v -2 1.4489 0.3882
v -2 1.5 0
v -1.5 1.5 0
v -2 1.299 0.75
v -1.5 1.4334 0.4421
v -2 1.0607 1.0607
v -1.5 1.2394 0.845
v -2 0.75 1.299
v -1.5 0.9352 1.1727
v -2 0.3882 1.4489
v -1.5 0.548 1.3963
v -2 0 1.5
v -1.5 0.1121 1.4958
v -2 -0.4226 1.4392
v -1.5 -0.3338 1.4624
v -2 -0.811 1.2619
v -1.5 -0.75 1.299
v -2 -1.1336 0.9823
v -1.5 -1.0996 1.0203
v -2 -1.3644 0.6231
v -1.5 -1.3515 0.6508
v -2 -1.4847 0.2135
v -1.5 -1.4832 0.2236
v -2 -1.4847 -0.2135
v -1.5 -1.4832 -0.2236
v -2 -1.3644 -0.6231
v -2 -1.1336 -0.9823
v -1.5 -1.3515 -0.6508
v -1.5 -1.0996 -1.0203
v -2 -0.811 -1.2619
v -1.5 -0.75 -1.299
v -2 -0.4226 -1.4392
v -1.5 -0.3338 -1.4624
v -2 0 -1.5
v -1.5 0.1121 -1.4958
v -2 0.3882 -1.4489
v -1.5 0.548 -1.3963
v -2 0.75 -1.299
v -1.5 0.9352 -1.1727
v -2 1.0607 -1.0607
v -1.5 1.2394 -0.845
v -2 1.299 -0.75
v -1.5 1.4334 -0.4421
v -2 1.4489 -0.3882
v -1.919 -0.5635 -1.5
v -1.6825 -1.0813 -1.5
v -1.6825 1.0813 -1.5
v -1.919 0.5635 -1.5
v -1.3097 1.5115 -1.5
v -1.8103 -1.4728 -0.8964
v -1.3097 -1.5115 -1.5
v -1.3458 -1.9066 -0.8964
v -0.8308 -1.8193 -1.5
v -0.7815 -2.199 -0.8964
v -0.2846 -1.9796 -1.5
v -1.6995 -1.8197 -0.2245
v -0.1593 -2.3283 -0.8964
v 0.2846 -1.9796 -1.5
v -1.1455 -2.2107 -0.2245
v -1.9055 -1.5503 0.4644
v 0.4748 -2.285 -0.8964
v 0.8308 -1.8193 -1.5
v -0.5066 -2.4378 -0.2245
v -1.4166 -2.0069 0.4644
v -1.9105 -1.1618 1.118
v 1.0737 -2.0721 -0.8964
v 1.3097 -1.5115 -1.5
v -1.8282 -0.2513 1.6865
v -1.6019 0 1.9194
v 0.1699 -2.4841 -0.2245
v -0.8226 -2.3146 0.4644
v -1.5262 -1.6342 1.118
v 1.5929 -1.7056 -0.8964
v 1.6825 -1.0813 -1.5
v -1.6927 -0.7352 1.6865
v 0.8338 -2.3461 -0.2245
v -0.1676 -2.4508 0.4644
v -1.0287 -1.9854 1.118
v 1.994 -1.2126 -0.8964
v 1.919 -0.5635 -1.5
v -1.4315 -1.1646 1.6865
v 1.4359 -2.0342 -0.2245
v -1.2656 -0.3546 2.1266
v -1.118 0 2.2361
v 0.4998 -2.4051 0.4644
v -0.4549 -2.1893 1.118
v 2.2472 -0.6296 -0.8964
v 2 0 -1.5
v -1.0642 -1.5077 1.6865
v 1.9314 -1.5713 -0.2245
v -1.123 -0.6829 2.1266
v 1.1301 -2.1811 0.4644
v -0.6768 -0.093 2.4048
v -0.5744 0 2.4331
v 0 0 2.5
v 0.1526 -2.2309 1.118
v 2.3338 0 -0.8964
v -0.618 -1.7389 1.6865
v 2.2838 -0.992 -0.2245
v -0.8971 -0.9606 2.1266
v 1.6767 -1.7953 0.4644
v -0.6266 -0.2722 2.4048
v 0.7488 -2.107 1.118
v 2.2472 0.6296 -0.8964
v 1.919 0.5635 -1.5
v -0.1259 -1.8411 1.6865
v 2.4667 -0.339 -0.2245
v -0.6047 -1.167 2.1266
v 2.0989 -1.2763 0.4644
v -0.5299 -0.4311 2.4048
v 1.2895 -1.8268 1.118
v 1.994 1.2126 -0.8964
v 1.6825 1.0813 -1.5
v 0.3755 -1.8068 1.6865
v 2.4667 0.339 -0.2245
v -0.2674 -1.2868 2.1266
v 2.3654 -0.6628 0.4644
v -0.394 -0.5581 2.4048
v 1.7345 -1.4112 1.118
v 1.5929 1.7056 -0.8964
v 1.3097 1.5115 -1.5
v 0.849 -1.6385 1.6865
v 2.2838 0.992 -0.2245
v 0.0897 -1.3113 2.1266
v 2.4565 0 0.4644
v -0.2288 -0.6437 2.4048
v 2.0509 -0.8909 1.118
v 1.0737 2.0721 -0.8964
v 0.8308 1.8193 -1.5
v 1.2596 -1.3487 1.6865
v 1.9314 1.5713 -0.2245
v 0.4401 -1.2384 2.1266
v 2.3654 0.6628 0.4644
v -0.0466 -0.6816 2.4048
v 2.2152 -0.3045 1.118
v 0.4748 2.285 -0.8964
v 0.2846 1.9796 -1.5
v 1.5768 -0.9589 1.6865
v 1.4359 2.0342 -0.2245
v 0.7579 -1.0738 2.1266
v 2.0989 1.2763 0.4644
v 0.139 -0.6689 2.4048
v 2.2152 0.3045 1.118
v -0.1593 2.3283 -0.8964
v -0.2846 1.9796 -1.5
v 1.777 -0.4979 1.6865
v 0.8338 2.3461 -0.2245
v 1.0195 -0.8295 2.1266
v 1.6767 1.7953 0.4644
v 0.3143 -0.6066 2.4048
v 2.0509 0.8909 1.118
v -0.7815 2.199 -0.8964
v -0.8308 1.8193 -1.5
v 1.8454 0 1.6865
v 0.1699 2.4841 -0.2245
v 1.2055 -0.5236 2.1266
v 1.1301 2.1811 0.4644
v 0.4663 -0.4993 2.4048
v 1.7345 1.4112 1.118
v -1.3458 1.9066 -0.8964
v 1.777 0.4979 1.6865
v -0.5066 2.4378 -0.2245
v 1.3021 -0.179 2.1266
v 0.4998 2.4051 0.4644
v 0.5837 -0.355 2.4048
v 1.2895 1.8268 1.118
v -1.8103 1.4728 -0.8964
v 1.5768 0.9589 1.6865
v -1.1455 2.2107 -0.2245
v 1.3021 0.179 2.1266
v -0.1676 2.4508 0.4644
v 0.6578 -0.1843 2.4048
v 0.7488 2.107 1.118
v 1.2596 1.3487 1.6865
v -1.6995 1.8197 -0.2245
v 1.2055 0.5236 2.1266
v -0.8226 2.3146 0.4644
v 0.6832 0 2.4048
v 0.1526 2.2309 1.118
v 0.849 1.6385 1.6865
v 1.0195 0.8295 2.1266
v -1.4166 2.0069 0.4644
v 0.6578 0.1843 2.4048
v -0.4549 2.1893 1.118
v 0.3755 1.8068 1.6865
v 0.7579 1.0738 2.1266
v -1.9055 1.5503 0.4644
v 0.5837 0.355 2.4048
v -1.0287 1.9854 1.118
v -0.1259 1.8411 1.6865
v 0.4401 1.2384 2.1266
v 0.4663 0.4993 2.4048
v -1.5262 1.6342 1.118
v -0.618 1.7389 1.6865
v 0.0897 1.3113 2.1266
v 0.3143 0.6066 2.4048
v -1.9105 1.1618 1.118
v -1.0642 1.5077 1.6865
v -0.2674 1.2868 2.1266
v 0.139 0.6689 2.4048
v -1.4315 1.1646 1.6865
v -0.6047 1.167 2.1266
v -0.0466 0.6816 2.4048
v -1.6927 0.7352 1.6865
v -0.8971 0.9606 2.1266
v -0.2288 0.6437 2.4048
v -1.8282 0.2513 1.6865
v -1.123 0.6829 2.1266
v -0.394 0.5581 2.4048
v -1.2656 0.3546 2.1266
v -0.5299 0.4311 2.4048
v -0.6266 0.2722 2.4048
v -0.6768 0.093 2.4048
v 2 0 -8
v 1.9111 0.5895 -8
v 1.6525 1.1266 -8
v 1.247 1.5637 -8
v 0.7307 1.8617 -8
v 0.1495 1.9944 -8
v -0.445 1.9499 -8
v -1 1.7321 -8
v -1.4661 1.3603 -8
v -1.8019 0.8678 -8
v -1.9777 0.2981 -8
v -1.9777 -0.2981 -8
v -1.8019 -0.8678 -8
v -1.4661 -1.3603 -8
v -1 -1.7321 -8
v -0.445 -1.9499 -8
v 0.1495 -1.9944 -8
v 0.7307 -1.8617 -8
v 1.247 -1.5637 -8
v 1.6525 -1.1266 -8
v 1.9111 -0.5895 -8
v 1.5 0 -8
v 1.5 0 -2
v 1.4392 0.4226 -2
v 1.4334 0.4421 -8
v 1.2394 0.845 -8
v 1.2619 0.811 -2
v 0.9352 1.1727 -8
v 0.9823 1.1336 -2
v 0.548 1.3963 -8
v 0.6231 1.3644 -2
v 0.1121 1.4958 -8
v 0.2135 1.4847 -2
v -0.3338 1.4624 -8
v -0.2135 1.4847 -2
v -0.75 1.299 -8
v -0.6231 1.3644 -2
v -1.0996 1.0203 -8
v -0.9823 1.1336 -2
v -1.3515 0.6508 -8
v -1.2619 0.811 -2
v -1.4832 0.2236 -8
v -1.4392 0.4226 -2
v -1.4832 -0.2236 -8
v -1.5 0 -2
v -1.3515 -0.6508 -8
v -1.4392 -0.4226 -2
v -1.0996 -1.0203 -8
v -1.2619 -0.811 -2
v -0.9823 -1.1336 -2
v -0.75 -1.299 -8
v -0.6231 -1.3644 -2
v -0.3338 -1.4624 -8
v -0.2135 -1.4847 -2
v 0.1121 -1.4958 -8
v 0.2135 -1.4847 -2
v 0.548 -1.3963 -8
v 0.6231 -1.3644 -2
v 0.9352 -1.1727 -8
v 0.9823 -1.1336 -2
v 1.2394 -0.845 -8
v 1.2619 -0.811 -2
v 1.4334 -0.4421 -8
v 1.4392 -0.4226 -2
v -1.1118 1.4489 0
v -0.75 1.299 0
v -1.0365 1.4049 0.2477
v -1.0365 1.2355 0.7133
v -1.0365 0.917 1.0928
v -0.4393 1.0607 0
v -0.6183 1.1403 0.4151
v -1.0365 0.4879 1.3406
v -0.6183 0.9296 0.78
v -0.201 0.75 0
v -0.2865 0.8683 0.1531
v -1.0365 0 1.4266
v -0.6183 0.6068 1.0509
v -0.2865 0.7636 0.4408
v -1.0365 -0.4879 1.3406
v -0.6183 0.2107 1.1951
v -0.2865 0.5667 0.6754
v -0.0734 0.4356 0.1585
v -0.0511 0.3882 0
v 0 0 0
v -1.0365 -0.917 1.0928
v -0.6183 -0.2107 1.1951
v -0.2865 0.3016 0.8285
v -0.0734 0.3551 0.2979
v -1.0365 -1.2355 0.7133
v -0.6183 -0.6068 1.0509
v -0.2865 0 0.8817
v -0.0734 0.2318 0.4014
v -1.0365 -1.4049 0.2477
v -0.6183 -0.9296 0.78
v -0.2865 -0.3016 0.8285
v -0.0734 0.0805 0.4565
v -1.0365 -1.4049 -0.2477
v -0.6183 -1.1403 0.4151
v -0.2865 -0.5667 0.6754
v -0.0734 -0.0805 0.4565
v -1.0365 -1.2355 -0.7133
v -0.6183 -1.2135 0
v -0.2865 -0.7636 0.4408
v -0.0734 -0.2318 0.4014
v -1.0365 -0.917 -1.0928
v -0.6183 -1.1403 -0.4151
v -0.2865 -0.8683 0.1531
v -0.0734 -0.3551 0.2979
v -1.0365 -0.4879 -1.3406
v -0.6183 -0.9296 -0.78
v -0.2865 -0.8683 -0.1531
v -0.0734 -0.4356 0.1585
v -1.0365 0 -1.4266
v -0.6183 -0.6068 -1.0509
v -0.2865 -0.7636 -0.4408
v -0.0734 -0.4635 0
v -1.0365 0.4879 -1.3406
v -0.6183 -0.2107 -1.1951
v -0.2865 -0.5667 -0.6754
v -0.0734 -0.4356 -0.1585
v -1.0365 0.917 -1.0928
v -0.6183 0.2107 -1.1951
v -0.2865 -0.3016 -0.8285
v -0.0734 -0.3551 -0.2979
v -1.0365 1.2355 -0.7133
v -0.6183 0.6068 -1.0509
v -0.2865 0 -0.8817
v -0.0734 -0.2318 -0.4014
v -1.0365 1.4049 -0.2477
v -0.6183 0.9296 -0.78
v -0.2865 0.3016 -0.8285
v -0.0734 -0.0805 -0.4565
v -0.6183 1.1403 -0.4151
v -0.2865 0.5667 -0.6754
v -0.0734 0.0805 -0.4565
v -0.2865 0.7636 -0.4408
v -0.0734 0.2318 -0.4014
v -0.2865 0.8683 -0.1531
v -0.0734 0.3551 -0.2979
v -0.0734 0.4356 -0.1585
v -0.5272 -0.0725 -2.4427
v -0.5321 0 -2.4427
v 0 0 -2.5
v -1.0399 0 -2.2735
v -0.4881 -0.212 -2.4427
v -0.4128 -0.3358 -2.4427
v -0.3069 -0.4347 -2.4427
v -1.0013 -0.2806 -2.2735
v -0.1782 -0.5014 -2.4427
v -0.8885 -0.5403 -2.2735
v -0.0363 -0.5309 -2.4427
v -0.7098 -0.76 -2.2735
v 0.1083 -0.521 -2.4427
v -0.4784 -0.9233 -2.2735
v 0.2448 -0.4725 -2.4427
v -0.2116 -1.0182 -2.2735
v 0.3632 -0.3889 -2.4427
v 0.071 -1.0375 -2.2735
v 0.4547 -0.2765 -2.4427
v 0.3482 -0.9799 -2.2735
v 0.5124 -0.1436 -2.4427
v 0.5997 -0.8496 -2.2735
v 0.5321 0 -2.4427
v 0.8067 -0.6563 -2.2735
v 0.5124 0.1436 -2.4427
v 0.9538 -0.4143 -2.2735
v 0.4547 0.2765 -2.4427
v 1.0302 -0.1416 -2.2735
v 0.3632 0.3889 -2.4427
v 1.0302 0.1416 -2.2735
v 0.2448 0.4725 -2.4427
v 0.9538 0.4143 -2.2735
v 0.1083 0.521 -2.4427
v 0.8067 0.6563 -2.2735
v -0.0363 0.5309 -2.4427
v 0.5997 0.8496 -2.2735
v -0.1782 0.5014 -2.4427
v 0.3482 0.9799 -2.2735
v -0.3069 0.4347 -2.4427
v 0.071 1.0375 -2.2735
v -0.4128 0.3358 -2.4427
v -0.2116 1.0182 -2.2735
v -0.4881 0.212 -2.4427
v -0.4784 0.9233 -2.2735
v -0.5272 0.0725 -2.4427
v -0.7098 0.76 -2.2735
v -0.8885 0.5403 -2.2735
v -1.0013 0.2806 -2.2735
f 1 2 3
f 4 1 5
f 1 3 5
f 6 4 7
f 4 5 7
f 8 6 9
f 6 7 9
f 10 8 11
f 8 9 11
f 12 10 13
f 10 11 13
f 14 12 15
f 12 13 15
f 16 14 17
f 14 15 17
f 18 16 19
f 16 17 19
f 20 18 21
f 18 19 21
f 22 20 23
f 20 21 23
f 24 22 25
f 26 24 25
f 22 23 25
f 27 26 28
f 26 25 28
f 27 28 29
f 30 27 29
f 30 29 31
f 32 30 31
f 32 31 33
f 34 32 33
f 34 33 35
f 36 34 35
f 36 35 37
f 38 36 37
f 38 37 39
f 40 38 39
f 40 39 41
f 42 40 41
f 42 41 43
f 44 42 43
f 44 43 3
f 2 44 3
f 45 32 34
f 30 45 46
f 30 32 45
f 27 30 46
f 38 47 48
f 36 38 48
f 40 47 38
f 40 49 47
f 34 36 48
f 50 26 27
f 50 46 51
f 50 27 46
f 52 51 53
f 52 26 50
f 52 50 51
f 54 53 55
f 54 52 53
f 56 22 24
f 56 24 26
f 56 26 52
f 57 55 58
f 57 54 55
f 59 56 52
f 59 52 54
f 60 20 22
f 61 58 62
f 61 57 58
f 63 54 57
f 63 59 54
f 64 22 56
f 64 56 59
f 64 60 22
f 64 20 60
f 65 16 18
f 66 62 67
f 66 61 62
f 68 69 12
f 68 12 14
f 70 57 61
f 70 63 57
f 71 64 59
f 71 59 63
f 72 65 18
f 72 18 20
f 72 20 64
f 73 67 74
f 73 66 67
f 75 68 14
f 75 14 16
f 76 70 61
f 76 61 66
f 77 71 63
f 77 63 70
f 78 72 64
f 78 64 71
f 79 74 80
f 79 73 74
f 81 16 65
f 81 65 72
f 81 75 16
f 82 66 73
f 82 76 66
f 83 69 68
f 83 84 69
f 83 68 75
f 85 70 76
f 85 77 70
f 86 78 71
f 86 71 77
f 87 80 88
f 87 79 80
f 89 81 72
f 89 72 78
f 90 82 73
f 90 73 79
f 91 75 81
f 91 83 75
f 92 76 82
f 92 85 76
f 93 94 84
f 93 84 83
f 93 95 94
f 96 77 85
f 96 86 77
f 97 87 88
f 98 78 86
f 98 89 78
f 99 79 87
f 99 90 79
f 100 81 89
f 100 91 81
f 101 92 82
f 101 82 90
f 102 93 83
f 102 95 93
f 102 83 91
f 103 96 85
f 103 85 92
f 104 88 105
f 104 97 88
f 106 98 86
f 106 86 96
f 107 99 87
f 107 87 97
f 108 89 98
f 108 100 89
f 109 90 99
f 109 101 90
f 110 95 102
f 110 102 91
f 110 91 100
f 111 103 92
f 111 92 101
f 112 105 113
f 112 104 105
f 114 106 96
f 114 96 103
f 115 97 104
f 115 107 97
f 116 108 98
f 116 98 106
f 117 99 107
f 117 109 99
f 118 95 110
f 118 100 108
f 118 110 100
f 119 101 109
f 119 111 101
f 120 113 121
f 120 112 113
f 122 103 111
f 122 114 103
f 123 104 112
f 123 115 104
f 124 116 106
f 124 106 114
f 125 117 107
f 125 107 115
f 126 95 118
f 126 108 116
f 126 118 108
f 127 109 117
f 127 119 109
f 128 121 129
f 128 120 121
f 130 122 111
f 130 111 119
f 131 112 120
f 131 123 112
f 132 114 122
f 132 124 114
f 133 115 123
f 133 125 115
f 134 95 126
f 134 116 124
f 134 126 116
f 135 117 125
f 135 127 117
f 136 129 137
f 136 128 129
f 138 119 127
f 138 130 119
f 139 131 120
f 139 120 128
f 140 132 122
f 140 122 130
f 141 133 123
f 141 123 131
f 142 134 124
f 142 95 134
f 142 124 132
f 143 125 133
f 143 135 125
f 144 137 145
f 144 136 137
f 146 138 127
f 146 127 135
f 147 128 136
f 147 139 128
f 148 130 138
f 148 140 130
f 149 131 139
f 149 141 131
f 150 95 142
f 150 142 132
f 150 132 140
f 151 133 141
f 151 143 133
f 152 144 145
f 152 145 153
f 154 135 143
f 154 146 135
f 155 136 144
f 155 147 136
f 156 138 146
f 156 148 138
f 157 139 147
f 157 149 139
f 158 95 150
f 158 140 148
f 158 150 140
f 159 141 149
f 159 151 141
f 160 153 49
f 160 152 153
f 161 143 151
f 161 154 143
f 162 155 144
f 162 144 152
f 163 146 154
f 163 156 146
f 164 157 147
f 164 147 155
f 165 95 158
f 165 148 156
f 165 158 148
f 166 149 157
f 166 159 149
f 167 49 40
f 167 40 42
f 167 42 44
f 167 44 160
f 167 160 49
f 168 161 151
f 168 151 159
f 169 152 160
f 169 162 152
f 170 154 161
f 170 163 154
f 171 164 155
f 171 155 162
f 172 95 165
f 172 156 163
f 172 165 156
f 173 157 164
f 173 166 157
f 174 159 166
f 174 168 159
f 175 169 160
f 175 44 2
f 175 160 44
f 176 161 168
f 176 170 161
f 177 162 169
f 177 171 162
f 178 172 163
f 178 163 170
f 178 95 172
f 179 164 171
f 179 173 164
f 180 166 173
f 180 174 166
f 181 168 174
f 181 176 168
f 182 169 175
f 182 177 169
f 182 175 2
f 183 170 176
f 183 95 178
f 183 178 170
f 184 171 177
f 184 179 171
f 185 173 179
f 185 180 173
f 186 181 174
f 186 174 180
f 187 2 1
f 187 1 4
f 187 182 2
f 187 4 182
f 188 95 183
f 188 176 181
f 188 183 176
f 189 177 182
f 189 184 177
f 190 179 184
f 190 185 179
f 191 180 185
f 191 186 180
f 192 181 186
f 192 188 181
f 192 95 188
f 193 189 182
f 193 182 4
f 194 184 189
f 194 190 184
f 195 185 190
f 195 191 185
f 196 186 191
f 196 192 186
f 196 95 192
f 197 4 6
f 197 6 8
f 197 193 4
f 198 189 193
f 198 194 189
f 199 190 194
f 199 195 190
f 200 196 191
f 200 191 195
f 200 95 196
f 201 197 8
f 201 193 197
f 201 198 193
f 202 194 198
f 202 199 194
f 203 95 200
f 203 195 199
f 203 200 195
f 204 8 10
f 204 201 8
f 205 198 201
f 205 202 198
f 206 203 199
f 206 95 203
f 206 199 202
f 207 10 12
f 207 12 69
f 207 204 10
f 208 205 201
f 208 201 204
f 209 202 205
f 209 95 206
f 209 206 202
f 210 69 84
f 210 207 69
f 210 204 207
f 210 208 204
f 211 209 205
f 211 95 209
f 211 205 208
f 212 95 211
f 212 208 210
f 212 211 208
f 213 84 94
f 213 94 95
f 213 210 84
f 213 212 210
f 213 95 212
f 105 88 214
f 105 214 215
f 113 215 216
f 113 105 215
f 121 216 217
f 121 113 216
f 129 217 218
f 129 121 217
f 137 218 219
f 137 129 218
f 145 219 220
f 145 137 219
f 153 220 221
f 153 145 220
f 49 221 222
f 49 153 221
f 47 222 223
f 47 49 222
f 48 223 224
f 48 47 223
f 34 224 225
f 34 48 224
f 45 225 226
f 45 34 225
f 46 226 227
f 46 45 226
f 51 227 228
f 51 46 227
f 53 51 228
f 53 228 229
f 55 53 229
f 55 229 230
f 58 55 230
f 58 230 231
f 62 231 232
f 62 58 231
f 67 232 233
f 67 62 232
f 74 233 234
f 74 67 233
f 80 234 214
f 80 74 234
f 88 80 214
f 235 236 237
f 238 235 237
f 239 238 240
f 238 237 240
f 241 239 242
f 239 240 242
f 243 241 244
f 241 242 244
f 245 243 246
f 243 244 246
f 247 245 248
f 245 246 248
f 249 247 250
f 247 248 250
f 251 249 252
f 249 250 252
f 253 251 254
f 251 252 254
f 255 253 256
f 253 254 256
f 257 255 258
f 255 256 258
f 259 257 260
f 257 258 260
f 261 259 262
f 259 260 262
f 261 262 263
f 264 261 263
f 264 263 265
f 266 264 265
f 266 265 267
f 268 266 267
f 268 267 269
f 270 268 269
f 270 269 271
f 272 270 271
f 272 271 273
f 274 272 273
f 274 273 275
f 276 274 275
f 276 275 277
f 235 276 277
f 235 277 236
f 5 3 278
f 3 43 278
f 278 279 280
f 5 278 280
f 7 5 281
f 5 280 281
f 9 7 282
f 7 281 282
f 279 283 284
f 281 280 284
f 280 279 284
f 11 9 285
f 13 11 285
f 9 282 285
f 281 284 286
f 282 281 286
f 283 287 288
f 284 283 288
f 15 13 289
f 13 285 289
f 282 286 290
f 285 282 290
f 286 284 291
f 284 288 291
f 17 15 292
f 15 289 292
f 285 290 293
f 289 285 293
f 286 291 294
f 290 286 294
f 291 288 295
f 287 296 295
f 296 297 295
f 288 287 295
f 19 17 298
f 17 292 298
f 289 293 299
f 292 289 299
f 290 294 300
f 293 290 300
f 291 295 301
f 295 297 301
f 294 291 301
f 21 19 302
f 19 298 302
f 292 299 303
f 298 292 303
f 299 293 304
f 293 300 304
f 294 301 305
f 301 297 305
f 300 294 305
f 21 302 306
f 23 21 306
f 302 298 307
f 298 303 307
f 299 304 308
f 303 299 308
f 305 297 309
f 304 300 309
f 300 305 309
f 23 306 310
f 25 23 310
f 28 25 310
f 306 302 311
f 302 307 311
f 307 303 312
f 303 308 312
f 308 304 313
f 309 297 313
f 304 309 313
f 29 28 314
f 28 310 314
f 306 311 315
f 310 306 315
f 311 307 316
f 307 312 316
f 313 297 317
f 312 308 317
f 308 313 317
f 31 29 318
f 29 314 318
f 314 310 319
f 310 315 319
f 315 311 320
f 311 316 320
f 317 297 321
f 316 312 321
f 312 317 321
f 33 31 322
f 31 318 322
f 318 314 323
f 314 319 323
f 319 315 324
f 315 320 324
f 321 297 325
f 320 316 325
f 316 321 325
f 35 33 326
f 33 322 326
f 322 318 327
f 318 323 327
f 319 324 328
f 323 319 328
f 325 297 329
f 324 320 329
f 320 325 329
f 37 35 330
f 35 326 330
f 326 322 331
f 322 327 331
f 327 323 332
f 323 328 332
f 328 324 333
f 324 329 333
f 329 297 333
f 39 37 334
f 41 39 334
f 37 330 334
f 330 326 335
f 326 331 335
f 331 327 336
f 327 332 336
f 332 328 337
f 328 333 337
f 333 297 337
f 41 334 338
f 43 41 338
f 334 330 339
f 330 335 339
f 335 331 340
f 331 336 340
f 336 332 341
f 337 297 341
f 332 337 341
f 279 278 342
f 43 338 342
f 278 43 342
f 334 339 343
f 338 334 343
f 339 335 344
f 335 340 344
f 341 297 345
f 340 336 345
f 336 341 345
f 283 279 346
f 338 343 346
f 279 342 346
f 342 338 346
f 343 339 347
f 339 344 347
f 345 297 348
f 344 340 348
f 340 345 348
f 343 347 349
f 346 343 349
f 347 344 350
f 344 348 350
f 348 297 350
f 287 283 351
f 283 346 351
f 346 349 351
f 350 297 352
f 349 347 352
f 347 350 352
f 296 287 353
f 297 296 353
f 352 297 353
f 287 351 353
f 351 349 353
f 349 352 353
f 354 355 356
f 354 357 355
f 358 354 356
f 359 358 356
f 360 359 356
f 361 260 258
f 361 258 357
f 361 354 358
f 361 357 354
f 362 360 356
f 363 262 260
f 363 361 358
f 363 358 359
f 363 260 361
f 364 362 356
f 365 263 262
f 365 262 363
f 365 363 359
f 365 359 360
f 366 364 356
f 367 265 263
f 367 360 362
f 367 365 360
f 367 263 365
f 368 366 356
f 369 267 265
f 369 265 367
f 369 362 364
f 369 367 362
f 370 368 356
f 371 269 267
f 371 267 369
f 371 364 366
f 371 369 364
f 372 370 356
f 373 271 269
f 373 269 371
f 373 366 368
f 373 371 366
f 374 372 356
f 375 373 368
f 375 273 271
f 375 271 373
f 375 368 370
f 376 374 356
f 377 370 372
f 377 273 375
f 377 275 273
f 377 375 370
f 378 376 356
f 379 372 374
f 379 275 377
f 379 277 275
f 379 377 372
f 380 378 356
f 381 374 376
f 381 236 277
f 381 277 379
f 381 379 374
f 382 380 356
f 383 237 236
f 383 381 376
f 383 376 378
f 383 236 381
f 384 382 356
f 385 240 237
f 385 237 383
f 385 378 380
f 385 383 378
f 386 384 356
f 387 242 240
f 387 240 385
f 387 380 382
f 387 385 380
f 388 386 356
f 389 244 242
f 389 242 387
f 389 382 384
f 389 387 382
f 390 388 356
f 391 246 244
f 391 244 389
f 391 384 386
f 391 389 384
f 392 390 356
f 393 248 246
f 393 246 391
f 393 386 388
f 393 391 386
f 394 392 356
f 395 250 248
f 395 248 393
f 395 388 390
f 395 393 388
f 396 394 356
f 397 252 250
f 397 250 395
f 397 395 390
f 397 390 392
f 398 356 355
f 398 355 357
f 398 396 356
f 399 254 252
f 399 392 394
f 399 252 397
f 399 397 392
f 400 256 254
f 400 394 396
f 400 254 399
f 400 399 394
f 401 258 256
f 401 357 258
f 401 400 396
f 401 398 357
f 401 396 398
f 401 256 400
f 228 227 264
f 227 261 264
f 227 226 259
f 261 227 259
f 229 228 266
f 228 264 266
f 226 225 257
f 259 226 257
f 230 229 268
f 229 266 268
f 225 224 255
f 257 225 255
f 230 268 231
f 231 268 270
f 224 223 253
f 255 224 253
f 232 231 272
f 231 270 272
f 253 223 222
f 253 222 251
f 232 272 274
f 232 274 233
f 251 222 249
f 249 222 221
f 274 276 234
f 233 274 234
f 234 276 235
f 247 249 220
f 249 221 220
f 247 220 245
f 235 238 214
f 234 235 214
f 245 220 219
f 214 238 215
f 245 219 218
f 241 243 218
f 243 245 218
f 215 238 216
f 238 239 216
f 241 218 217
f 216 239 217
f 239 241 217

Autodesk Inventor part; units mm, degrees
ref_plane "YZ Plane" through (0, 0, 0) normal (1, 0, 0) x (0, 1, 0)
ref_plane "XZ Plane" through (0, 0, 0) normal (0, 1, 0) x (-1, 0, 0)
ref_plane "XY Plane" through (0, 0, 0) normal (0, 0, 1) x (1, 0, 0)
sketch "Sketch1" plane through (0, 0, 0) normal (0, 1, 0) x (-1, 0, 0)
  circle A0 centre (0, 0) radius 2.5
  line L0 (0, -3.5) -> (0, 3.5) projected
  line L1 (0, 2.5) -> (0, -2.5)
  dimension "d0" = 5
revolve "Revolution1" add sketch "Sketch1" angle 360 about axis through (0, 0, 0) along (0, 0, 1) picked at (0.5196, 0.6515) contours A0 L0
sketch "Sketch2" plane through (0, 0, 0) normal (0, 0, 1) x (1, 0, 0)
  circle A0 centre (0, 0) radius 2
  circle A1 centre (0, 0) radius 1.5
  dimension "d2" = 4
  dimension "d3" = 3
extrude "Extrusion1" add sketch "Sketch2" against normal blind 8
sketch "Sketch3" plane through (0, 0, 0) normal (1, 0, 0) x (0, 1, 0)
  circle A0 centre (0, 0) radius 1.5
  dimension "d6" = 3
extrude "Extrusion2" cut sketch "Sketch3" against normal through all
fillet "Fillet1" radius 1.5 1 edges at (0, -1.5, 0)
properties part number "P_snap_001" material "PC/ABS Plastic"
